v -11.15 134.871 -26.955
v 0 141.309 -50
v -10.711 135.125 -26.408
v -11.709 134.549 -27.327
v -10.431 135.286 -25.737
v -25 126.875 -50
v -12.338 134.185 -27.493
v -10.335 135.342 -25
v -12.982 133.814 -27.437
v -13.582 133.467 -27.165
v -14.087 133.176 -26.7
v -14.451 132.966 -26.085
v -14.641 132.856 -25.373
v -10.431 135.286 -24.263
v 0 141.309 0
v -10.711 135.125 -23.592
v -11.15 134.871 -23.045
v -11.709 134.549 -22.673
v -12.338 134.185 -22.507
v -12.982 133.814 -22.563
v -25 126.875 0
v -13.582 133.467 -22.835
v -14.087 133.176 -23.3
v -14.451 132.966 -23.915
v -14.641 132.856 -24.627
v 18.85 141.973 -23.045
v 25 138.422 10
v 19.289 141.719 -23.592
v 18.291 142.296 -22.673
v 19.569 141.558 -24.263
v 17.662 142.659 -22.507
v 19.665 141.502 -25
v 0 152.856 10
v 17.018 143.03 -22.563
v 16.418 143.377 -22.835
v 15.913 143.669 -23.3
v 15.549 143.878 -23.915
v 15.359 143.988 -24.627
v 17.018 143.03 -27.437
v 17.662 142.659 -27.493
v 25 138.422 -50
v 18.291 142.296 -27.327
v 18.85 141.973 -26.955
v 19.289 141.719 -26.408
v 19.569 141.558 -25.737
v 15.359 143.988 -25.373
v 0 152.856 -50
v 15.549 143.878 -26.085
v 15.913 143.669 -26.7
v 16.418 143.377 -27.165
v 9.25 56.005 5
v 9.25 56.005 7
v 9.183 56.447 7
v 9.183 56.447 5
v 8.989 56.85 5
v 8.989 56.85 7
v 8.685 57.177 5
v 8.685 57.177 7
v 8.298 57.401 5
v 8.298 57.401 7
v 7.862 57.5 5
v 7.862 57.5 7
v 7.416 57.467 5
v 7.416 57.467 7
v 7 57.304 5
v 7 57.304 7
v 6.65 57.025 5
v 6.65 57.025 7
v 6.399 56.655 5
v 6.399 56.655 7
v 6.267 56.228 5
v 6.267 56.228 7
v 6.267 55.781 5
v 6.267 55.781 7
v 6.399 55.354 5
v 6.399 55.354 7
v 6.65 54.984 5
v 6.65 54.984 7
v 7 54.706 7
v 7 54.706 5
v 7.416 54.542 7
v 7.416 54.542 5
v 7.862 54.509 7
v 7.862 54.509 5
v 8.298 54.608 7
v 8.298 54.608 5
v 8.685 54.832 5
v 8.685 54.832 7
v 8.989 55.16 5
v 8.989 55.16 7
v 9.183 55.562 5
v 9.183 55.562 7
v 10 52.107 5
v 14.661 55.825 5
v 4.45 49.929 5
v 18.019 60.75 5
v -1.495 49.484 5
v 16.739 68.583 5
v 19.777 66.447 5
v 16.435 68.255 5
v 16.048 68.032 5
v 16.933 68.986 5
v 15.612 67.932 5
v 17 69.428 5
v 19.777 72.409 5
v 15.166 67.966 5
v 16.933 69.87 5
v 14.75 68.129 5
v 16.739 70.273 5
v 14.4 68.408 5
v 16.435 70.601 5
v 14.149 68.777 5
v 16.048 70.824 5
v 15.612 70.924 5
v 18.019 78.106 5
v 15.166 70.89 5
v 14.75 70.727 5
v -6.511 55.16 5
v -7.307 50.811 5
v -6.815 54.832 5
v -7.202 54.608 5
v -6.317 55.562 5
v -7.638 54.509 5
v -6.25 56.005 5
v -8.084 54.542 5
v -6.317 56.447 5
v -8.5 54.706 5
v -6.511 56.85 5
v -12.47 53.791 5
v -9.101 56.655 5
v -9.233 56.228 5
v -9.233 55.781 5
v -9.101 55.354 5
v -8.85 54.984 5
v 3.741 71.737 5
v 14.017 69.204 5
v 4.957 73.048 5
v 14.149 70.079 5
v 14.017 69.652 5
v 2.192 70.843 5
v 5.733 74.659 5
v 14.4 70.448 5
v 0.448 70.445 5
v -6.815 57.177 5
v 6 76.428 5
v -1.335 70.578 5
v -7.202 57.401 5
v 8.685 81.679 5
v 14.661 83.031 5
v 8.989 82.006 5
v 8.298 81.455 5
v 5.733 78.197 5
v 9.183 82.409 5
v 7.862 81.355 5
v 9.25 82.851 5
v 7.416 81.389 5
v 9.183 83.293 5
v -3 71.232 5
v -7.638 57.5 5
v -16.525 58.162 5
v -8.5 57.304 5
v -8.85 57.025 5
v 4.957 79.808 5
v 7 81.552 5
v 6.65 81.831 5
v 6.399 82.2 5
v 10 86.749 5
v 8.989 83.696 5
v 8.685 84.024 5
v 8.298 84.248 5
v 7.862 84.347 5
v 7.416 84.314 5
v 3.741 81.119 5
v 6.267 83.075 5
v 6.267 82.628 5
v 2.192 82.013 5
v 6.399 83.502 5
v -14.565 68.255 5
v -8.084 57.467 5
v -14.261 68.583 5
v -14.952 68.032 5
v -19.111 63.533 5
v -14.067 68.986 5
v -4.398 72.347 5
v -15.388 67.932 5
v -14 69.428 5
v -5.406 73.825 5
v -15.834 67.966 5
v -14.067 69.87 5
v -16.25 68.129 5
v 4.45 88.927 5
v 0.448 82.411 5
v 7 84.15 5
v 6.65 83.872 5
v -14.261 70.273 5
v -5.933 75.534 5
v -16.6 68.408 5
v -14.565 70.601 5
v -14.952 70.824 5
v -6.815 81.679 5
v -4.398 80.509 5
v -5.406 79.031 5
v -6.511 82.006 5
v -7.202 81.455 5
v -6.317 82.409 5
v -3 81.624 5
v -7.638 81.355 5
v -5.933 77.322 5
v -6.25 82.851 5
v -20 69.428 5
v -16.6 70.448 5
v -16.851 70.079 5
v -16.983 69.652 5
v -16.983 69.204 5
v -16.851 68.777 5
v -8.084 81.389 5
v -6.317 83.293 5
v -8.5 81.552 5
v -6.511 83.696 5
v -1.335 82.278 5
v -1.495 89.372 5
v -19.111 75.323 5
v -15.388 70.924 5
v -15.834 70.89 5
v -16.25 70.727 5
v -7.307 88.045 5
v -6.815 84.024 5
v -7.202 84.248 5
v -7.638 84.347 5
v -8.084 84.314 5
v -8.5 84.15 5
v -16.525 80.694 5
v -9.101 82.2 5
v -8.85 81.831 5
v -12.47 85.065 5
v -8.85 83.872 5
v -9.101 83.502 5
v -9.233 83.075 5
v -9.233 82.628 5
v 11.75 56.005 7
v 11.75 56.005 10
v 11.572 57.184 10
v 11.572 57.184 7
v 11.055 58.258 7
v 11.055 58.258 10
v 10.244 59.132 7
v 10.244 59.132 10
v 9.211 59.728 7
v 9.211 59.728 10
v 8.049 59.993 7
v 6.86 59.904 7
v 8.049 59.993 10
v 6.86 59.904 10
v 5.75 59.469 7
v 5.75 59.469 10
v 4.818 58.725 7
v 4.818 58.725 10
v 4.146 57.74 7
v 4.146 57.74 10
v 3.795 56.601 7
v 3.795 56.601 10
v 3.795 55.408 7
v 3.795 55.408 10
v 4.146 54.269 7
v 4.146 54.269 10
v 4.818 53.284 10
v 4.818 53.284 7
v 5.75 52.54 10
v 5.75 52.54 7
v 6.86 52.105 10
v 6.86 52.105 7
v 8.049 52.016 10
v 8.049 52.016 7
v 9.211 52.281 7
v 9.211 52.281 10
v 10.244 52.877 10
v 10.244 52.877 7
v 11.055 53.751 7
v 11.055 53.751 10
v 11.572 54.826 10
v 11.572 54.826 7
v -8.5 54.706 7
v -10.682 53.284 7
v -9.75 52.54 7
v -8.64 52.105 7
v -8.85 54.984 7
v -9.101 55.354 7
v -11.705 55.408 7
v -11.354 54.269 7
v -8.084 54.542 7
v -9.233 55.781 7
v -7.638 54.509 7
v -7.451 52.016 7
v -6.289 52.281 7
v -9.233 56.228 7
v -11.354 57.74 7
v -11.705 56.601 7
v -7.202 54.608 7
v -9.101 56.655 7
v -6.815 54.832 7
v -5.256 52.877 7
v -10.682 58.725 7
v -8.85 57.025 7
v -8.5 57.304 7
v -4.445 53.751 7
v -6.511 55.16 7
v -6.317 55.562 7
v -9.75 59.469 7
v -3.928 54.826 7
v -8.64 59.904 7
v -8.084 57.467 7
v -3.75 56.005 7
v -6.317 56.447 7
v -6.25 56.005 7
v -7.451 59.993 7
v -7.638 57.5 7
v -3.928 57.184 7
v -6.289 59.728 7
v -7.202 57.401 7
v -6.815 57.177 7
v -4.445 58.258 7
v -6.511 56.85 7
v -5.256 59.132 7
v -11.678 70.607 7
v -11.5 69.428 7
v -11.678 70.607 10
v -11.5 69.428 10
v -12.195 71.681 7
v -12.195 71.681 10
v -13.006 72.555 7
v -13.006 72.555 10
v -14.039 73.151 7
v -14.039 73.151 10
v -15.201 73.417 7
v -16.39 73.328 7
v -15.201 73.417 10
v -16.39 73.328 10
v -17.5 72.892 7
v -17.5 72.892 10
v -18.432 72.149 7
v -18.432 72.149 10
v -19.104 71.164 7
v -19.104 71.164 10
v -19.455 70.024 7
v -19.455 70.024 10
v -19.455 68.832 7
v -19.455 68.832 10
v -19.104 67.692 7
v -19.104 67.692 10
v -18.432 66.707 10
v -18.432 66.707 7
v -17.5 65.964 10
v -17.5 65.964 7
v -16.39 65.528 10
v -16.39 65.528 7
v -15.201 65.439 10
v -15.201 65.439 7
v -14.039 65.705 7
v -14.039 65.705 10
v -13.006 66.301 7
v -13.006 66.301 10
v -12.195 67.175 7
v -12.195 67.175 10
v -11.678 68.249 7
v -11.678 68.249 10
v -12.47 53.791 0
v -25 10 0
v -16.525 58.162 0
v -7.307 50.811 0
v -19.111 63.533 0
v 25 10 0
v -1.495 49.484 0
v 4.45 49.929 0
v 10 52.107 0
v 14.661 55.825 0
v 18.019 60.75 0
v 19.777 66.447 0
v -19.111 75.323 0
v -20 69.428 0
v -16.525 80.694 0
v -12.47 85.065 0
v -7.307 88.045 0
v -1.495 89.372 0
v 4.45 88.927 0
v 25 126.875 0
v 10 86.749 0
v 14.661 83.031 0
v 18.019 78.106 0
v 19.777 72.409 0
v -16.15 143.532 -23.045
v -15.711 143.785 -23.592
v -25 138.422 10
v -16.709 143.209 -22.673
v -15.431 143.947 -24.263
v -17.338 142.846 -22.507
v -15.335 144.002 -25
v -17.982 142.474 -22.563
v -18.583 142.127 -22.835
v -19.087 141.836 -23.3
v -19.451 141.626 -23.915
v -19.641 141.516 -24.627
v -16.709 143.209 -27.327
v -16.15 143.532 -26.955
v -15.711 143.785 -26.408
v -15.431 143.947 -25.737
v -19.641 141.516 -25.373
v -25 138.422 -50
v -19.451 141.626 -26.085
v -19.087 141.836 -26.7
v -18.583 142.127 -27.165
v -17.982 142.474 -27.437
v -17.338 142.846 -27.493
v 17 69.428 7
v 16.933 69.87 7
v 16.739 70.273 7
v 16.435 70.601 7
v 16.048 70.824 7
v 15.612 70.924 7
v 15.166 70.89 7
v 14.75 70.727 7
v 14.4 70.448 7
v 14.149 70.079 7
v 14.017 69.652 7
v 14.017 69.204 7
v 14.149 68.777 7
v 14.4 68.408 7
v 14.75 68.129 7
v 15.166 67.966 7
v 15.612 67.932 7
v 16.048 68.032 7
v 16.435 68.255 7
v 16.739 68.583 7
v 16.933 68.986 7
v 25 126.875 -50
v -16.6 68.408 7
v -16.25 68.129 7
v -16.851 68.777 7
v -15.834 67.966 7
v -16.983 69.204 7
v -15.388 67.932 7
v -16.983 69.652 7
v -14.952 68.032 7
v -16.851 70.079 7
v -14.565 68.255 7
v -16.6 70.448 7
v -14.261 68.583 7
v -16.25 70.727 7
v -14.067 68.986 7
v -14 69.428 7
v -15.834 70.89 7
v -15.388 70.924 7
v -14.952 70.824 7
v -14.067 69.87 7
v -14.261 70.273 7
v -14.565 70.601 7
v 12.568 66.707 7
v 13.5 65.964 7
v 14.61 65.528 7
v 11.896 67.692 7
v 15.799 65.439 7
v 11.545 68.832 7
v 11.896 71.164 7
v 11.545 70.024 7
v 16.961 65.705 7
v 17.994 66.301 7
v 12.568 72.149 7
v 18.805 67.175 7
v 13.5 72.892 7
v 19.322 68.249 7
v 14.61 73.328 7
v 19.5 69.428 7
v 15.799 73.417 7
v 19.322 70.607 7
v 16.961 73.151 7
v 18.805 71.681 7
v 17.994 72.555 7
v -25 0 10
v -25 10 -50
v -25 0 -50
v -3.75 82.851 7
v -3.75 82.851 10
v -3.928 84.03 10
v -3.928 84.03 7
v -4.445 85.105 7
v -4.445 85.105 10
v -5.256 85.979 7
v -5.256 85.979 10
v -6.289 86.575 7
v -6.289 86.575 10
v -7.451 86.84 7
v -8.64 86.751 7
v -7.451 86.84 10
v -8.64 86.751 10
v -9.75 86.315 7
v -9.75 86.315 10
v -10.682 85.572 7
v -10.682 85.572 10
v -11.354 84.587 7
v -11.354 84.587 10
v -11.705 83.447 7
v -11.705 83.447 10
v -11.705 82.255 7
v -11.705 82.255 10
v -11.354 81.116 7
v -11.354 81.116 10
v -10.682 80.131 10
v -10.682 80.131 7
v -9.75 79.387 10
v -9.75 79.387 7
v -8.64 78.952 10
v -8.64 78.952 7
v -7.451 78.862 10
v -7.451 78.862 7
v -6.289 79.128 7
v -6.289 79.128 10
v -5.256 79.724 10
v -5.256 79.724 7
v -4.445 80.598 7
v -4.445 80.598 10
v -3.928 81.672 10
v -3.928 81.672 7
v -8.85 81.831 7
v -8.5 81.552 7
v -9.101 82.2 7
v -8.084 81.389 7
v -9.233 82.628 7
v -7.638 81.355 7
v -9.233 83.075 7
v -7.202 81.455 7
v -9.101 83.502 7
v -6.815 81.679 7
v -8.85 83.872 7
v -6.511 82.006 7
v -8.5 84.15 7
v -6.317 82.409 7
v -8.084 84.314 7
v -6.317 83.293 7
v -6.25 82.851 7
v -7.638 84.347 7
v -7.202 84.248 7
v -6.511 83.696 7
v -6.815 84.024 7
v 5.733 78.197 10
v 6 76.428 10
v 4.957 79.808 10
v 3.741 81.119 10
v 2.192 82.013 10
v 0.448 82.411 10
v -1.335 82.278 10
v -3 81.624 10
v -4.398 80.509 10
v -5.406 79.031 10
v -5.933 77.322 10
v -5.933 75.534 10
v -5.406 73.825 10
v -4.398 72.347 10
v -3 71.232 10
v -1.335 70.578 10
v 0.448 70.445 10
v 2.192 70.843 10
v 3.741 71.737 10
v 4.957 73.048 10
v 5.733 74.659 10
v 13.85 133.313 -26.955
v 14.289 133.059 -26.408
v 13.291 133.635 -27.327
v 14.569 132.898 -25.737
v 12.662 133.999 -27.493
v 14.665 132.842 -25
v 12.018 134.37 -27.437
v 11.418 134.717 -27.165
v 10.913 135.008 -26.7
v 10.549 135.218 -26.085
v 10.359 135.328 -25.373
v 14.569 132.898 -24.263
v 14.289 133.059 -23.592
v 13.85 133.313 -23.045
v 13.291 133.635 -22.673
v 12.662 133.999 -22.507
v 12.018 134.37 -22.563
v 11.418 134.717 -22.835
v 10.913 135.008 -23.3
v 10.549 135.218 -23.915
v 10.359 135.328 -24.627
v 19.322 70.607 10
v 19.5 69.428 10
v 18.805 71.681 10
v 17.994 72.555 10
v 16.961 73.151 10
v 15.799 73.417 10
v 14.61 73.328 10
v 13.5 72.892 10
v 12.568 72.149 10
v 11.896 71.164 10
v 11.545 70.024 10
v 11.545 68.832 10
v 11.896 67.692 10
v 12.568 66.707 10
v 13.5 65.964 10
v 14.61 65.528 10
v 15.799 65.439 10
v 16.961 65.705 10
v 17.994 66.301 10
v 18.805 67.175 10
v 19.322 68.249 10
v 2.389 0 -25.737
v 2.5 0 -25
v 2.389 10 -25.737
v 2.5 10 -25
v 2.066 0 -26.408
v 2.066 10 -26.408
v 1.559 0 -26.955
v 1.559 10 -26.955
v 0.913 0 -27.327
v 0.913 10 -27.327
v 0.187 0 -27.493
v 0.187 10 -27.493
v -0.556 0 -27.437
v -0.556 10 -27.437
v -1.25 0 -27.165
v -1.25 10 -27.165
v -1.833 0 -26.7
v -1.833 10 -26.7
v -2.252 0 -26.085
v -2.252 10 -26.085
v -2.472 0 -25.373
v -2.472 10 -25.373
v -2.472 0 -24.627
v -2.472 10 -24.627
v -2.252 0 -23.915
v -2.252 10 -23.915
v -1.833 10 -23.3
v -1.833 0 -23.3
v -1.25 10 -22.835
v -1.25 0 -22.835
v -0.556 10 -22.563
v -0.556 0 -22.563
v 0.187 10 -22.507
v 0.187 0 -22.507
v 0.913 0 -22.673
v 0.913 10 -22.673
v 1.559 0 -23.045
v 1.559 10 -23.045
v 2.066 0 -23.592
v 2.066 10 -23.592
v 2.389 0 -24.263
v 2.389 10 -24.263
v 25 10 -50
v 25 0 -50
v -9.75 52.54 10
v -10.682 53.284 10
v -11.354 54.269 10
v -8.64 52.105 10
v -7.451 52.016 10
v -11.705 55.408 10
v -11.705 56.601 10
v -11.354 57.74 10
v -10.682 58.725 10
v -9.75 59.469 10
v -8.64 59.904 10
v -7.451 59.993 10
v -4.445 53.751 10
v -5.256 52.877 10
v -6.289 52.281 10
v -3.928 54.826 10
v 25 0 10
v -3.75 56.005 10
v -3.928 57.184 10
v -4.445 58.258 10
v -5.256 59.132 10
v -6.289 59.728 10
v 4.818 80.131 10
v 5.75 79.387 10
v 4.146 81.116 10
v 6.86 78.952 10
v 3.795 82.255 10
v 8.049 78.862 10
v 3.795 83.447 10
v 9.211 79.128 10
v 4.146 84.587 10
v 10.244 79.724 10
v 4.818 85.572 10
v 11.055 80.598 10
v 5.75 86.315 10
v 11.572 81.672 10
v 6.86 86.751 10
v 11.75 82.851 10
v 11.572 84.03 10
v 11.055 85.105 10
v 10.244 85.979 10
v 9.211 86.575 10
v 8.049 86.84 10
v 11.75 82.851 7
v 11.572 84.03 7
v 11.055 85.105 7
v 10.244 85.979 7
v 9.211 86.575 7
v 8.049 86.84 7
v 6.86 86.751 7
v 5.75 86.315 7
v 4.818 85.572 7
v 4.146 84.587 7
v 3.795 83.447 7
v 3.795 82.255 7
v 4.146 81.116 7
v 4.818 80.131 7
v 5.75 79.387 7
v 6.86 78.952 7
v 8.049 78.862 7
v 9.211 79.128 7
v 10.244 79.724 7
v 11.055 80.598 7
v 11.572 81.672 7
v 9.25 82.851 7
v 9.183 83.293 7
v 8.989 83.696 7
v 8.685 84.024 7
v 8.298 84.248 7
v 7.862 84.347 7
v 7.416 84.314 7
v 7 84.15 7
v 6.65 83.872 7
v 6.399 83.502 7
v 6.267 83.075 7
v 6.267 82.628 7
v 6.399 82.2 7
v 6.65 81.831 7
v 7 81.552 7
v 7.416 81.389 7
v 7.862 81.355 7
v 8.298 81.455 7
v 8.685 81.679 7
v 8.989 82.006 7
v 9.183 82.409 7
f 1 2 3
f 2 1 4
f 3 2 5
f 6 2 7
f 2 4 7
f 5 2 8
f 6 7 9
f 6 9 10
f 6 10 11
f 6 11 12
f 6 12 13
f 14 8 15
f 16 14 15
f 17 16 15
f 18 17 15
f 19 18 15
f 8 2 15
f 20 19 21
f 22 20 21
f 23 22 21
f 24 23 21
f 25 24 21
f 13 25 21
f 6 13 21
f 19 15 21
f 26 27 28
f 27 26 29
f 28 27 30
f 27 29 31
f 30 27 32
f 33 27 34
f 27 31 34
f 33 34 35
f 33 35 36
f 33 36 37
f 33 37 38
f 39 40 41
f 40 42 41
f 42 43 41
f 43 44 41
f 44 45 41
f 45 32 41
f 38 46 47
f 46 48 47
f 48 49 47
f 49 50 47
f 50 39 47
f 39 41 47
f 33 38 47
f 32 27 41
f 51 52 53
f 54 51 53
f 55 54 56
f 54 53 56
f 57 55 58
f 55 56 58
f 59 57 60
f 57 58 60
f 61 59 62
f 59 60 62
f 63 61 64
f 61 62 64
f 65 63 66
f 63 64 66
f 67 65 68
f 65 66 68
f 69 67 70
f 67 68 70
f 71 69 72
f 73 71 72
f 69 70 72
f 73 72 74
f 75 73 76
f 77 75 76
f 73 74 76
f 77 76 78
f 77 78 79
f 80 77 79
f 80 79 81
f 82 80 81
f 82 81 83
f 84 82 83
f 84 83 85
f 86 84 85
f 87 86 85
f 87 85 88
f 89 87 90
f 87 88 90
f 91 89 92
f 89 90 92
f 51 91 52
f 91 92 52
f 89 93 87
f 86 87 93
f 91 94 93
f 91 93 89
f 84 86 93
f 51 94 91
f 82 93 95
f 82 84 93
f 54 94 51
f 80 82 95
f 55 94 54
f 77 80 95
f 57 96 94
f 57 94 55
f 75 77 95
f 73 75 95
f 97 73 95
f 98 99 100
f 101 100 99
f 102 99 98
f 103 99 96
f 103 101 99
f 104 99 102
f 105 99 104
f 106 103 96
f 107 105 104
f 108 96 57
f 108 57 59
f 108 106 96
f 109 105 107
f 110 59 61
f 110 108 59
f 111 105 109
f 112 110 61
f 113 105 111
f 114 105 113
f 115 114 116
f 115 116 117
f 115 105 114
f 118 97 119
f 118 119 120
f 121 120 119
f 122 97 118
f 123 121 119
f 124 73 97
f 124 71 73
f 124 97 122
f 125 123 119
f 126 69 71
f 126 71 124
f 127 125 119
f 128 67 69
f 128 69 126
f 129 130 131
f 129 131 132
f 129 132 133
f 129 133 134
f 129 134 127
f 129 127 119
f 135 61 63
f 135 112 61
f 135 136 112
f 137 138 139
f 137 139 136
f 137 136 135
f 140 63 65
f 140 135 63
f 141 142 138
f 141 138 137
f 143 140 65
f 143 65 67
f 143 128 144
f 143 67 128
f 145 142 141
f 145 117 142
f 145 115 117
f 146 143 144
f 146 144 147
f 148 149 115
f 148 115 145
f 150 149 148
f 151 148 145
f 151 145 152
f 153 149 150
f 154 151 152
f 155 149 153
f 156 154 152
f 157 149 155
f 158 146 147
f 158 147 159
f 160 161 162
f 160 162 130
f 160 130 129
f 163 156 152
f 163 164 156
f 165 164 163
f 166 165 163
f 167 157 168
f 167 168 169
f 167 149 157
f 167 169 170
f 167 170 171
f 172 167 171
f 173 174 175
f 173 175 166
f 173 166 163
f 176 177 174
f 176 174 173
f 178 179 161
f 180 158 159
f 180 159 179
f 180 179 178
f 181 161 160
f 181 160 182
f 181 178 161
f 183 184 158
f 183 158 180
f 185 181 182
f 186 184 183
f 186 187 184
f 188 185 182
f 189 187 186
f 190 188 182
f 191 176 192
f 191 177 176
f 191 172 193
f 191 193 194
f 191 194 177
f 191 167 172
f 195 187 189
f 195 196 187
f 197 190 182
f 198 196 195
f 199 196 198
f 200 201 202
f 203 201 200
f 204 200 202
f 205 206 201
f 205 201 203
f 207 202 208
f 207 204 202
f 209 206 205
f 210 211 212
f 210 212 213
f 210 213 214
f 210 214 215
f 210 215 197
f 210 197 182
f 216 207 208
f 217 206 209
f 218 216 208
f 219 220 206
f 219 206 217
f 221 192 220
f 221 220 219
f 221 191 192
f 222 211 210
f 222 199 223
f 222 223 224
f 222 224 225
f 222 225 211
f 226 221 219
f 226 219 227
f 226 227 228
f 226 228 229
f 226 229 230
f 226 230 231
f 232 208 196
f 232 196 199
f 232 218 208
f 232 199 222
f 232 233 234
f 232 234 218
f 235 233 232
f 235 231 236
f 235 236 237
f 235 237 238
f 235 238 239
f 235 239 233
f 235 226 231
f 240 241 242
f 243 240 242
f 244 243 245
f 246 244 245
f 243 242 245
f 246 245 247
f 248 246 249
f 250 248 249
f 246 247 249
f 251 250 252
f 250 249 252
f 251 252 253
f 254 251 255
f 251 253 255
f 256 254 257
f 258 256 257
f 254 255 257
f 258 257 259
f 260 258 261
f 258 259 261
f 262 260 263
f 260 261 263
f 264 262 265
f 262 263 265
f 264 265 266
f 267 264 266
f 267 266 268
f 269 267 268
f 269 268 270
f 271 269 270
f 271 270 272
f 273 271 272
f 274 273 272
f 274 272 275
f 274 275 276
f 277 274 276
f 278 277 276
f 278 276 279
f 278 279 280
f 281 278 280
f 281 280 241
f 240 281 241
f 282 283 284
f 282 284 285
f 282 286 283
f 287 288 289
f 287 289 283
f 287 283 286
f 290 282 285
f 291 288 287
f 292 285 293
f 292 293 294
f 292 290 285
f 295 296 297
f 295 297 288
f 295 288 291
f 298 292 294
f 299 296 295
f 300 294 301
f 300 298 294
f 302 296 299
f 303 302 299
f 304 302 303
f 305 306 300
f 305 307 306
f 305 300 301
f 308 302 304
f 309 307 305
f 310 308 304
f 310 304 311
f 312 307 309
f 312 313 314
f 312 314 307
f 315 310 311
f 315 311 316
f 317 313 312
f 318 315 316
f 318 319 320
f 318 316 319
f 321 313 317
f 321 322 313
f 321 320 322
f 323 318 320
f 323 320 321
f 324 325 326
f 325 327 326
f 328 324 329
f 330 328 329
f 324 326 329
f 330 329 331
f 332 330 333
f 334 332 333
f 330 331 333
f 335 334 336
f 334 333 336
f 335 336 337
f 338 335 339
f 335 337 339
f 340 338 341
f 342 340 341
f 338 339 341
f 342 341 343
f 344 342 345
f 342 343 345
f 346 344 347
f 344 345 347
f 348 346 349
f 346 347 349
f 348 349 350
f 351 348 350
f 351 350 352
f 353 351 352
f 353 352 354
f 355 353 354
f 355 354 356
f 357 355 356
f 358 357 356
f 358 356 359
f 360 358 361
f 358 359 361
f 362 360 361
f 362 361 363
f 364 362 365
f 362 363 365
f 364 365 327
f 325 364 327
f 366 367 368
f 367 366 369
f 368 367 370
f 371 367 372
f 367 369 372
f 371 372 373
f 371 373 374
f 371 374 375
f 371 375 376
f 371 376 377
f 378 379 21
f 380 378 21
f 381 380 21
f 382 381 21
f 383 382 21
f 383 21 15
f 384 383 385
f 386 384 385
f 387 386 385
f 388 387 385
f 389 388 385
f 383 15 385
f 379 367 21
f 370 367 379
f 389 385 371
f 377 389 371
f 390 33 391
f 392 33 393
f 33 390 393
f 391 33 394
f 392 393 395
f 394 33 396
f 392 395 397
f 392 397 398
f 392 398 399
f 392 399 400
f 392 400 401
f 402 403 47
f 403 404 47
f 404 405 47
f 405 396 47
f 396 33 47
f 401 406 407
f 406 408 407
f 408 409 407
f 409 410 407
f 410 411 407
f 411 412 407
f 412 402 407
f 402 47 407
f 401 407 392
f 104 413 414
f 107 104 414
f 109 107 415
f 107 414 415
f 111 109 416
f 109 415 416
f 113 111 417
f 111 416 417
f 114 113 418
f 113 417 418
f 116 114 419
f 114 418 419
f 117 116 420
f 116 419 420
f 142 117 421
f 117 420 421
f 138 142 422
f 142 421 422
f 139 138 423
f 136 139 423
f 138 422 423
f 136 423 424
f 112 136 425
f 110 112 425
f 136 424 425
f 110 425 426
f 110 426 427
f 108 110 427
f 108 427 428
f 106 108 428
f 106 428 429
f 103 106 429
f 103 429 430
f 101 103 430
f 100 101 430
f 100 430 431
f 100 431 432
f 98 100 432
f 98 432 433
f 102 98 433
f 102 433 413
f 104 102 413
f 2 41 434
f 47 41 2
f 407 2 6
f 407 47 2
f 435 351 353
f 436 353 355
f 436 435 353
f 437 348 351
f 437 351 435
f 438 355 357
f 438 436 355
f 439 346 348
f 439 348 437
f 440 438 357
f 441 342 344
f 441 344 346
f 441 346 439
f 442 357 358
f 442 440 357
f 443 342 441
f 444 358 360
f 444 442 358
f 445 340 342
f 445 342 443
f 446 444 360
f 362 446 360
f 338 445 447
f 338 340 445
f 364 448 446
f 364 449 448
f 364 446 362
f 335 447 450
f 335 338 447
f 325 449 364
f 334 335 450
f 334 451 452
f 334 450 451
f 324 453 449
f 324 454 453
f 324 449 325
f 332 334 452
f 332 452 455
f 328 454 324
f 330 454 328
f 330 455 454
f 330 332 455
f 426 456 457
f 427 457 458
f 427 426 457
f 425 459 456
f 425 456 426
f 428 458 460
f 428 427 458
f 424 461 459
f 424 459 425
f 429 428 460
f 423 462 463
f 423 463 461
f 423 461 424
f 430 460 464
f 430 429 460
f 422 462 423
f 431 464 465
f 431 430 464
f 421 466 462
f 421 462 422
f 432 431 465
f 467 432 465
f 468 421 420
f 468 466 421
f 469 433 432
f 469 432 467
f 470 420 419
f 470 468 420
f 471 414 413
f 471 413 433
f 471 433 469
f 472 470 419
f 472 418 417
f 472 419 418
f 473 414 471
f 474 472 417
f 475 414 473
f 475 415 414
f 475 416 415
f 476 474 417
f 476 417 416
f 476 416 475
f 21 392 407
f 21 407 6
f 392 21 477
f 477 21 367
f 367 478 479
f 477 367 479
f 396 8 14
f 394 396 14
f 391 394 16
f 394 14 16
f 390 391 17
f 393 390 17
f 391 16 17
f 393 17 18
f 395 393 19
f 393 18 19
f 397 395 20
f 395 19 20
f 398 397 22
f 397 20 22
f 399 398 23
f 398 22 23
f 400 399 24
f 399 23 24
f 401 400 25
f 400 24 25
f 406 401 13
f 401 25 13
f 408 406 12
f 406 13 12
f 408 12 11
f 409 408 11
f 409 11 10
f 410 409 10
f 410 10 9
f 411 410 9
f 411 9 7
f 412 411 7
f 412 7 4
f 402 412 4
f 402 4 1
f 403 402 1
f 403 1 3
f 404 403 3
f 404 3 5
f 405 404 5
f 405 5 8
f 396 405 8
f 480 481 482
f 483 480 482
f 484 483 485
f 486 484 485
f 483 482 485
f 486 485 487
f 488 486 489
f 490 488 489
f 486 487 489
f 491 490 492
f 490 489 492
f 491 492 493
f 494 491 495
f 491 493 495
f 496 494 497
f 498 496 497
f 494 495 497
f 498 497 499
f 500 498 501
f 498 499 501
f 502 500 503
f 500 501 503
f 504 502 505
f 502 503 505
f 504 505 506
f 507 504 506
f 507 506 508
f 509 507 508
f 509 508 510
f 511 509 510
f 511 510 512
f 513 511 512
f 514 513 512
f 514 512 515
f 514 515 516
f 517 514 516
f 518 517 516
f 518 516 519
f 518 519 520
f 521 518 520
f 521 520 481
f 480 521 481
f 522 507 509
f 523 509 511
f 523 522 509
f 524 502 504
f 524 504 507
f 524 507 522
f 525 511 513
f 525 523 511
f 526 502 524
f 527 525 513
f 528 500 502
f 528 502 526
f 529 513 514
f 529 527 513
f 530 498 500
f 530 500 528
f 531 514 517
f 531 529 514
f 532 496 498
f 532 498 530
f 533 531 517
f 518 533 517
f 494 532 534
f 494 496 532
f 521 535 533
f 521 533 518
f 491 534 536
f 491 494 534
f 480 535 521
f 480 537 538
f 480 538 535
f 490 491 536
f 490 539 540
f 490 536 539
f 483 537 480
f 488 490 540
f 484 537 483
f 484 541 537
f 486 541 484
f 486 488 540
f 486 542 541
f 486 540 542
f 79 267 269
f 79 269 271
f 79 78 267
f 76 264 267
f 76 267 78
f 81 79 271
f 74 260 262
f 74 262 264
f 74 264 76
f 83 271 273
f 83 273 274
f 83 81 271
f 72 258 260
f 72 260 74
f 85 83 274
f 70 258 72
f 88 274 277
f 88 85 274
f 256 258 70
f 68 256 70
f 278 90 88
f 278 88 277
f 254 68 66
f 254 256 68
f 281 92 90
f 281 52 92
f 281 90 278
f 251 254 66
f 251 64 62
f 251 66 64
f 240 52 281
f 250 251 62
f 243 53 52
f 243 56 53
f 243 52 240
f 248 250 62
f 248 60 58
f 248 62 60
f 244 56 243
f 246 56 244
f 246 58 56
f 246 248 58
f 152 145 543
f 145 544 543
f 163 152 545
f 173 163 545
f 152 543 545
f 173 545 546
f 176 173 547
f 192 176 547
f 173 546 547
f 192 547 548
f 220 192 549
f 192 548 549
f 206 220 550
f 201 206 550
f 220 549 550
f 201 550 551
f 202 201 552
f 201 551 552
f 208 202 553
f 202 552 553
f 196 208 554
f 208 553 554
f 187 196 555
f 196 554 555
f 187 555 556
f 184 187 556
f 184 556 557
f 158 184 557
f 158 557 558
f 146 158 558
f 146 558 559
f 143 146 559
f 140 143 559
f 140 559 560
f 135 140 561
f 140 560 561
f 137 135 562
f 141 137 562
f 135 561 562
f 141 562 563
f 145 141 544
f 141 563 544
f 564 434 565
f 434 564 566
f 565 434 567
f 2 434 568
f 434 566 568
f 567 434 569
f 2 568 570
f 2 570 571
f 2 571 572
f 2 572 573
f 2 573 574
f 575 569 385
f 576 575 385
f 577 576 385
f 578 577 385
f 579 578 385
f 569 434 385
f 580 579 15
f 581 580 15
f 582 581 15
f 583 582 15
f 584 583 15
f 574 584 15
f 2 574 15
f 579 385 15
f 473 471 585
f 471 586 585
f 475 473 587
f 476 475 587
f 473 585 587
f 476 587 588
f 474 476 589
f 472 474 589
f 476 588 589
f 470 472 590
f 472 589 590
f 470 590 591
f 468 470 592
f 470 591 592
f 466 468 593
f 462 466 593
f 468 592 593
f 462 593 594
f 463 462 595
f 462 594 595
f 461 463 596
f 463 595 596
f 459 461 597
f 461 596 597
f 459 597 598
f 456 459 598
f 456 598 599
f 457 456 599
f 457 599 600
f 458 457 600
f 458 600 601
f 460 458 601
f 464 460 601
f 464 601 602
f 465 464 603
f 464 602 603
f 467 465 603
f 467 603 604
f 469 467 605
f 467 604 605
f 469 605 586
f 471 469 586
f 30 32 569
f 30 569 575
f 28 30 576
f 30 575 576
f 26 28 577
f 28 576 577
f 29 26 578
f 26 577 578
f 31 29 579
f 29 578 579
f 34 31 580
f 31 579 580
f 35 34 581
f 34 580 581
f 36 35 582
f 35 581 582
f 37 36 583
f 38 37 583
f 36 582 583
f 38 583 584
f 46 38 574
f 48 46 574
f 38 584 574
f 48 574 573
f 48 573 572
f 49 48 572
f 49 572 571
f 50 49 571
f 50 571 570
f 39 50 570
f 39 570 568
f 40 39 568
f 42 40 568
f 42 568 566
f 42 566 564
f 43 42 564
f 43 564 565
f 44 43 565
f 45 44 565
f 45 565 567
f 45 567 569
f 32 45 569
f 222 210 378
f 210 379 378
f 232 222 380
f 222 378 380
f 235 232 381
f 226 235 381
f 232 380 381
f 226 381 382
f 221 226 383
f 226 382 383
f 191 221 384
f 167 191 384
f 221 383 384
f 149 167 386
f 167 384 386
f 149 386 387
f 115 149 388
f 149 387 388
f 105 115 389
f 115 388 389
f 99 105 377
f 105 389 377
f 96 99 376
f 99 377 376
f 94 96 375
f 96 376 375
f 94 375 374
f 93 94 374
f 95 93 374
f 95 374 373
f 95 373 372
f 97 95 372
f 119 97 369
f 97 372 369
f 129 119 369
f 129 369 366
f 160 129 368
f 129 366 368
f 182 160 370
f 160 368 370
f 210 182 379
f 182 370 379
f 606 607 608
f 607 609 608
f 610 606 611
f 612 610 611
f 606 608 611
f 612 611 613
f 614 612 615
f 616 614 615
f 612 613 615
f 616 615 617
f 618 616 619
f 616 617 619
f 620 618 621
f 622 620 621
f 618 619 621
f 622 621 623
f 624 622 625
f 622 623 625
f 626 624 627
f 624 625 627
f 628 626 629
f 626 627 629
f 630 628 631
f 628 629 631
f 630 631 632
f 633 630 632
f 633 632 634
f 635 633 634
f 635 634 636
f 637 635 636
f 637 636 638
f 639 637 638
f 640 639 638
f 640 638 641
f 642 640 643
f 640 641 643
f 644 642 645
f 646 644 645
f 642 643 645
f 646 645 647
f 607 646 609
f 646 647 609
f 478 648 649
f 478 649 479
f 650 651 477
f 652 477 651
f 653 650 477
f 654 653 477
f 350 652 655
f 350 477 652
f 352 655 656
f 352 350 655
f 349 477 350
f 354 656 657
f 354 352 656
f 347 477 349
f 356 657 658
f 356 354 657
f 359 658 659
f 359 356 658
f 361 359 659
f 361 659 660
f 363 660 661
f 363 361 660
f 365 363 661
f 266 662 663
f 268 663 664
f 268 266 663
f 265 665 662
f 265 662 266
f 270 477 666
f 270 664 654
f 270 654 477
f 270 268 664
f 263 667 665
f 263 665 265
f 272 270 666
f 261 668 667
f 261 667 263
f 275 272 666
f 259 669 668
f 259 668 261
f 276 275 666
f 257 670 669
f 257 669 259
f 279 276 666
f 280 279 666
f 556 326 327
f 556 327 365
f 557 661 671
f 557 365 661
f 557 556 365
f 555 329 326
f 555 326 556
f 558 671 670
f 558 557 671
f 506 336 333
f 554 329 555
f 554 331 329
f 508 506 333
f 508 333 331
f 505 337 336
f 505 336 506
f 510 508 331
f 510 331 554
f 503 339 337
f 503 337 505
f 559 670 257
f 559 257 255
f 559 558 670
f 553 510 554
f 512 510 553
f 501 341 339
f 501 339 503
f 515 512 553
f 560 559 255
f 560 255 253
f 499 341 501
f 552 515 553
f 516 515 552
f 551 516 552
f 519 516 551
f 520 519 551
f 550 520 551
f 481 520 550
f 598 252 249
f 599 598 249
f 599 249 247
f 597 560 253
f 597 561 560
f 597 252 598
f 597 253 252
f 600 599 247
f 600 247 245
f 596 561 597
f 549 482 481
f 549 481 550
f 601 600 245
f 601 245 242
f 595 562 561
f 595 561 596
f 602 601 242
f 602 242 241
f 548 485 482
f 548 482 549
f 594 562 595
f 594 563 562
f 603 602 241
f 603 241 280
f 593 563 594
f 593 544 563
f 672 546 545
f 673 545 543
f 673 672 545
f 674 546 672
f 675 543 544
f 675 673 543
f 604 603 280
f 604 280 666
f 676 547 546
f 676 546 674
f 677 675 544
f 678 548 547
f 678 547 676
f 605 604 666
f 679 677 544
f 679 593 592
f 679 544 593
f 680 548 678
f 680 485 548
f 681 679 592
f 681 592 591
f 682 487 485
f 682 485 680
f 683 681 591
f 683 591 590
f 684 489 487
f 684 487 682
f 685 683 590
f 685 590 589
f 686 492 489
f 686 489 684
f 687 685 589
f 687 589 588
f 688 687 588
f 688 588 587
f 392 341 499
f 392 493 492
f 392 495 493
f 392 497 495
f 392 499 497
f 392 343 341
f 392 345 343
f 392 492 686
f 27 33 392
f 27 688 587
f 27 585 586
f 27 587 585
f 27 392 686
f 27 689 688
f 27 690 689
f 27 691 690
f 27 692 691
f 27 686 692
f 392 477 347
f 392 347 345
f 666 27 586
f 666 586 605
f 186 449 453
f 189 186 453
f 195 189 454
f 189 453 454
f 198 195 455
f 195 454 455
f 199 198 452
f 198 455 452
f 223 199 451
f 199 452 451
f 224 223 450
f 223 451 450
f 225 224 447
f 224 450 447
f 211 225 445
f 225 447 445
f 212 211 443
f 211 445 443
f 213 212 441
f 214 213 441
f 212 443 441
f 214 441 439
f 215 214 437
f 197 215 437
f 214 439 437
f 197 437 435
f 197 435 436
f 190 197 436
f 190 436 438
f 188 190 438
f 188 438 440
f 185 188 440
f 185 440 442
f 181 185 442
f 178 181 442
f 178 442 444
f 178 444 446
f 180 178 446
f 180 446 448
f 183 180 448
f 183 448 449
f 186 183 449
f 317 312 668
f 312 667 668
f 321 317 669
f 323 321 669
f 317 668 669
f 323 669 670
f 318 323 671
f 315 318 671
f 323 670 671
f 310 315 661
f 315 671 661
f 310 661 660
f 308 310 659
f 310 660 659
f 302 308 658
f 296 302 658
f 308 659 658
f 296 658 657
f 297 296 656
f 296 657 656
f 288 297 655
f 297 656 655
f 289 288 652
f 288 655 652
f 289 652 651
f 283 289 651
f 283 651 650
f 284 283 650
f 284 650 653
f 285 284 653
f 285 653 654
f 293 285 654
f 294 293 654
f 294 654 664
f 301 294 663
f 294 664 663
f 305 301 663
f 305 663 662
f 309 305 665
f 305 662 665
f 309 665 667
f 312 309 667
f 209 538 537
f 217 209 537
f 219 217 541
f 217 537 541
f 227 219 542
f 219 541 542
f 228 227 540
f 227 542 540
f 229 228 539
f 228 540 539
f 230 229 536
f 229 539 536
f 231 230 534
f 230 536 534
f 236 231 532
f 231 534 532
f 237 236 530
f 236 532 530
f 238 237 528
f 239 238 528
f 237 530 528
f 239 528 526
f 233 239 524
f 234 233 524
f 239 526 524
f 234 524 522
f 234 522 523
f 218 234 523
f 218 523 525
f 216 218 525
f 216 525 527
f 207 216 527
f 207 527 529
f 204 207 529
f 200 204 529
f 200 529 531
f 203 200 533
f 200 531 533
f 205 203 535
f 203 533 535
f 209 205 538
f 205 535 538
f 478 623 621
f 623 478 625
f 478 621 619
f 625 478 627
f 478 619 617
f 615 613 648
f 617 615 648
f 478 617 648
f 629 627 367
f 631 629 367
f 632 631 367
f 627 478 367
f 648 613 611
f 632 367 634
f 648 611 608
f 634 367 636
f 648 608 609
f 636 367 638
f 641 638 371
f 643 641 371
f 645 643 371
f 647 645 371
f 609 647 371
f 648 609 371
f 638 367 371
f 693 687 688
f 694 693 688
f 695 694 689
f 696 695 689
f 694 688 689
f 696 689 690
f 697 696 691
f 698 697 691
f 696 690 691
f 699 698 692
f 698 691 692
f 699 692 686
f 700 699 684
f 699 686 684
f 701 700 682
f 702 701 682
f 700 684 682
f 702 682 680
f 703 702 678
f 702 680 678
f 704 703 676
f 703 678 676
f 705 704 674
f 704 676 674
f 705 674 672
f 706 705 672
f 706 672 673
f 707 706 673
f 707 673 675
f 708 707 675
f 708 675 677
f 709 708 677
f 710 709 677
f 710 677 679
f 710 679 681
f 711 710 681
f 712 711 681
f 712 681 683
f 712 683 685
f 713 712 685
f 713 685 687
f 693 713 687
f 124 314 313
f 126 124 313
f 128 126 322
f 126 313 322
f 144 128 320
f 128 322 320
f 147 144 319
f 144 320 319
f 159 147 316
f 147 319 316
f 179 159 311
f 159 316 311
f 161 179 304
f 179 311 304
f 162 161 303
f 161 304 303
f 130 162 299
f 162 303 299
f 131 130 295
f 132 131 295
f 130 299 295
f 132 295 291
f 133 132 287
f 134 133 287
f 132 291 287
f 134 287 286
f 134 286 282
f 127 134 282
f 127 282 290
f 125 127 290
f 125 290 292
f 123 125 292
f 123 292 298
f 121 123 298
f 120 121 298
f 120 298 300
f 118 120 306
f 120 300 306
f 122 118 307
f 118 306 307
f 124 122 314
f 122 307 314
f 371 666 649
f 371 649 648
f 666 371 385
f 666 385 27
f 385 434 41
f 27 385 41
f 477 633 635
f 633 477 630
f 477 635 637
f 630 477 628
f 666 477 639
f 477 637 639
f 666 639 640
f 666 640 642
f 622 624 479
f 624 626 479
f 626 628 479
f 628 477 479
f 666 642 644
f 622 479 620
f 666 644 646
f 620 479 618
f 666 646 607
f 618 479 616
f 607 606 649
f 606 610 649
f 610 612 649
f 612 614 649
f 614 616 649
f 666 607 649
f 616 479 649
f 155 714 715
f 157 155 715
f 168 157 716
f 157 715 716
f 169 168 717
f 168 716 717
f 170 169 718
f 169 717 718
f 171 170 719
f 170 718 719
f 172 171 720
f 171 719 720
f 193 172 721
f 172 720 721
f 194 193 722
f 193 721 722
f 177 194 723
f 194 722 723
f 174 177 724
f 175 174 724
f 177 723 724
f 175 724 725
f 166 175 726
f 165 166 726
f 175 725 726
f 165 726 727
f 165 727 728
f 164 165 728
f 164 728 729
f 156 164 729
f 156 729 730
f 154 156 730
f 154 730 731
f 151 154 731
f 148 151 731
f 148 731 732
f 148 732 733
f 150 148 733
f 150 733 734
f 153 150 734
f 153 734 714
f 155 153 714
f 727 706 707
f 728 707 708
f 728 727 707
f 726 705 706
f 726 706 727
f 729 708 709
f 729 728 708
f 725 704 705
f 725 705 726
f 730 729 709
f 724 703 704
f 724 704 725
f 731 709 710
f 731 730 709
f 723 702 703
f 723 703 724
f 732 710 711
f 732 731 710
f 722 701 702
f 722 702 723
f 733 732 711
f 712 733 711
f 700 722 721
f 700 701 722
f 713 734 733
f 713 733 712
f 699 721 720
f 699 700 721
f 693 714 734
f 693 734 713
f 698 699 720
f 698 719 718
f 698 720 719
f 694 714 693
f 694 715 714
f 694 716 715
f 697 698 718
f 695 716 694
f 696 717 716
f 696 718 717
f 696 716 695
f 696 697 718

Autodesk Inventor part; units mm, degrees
ref_plane "YZ Plane" through (0, 0, 0) normal (1, 0, 0) x (0, 1, 0)
ref_plane "XZ Plane" through (0, 0, 0) normal (0, 1, 0) x (-1, 0, 0)
ref_plane "XY Plane" through (0, 0, 0) normal (0, 0, 1) x (1, 0, 0)
sketch "Sketch1" plane through (0, 0, 0) normal (0, 0, 1) x (1, 0, 0)
  line L0 (0, 0) -> (0, 152.8559)
  line L1 (0, 152.8559) -> (-25, 138.4222)
  line L2 (-25, 138.4222) -> (-25, 0)
  line L3 (-25, 0) -> (25, 0)
  line L4 (25, 0) -> (25, 138.4222)
  line L5 (25, 138.4222) -> (0, 152.8559)
  dimension "d0" = 152.8559
  dimension "d1" = 60
  dimension "d2" = 60
  dimension "d3" = 50
extrude "Extrusion1" add sketch "Sketch1" along normal blind 10
sketch "Sketch2" plane through (0, 0, 0) normal (0, 0, -1) x (-1, 0, 0)
  line L0 (0, 152.8559) -> (25, 138.4222) projected
  line L1 (-25, 138.4222) -> (0, 152.8559) projected
  line L2 (25, 0) -> (-25, 0) projected
  line L3 (-25, 0) -> (25, 0)
  line L4 (25, 0) -> (25, 10)
  line L5 (25, 10) -> (-25, 10)
  line L6 (-25, 10) -> (-25, 0)
  line L7 (25, 138.4222) -> (25, 0) construction
  line L8 (-25, 0) -> (-25, 138.4222) construction
  line L9 (-25, 126.8751) -> (0, 141.3089)
  line L10 (0, 141.3089) -> (25, 126.8751)
  line L11 (25, 138.4222) -> (25, 0) projected
  line L12 (-25, 126.8751) -> (-25, 138.4222)
  line L13 (0, 152.8559) -> (25, 138.4222) projected
  line L14 (25, 126.8751) -> (25, 138.4222)
  point P0 (0, 0)
  dimension "d6" = 10
  dimension "d7" = 10
extrude "Extrusion2" add sketch "Sketch2" along normal blind 50
sketch "Sketch3" plane through (0, 141.3089, -50) normal (-0.5, -0.8660254, 0) x (0.8660254, -0.5, 0)
  circle A0 centre (14.4338, 25) radius 2.5
  line L0 (28.8675, 50) -> (28.8675, 0) projected
  line L1 (28.8675, 0) -> (0, 0) projected
  point P0 (70.6545, 50)
  point P1 (14.4338, 0)
  point P2 (28.8675, 25)
  dimension "d10" = 5
extrude "Extrusion3" cut sketch "Sketch3" against normal through all
sketch "Sketch4" plane through (-25, 126.8751, -50) normal (0.5, -0.8660254, 0) x (0.8660254, 0.5, 0)
  line L0 (0, 50) -> (0, 0) projected
  line L1 (28.8675, 0) -> (0, 0) projected
  circle A0 centre (14.4338, 25) radius 2.5
  point P0 (-41.7869, 50)
  point P1 (14.4338, 0)
  point P2 (0, 25)
  dimension "d13" = 5
extrude "Extrusion4" cut sketch "Sketch4" against normal through all
sketch "Sketch5" plane through (-25, 10, 0) normal (0, 1, 0) x (1, 0, 0)
  line L0 (0, 0) -> (0, 50) projected
  line L1 (0, 50) -> (50, 50) projected
  circle A0 centre (25, 25) radius 2.5
  point P0 (25, 0)
  point P1 (25, 50)
  point P2 (0, 25)
  dimension "d16" = 5
extrude "Extrusion5" cut sketch "Sketch5" against normal through all
sketch "Sketch6" plane through (0, 0, 10) normal (0, 0, 1) x (1, 0, 0)
  circle A0 centre (0, 76.428) radius 6
  line L0 (-25, 138.4222) -> (0, 152.8559) construction
  line L1 (0, 152.8559) -> (0, 0) construction
  circle A1 centre (0, 69.428) radius 1.5 construction
  circle A2 centre (15.5, 69.428) radius 1.5
  circle A3 centre (7.75, 82.8513) radius 1.5
  circle A4 centre (-7.75, 82.8513) radius 1.5
  circle A5 centre (-15.5, 69.428) radius 1.5
  circle A6 centre (-7.75, 56.0046) radius 1.5
  circle A7 centre (7.75, 56.0046) radius 1.5
  point P0 (0, 76.428)
  dimension "d19" = 12
  dimension "d22" = 3
  dimension "d23" = 7
  dimension "d24" = 3
  dimension "d25" = 15.5
  dimension "d28" = 360
extrude "Extrusion6" cut sketch "Sketch6" against normal through all
sketch "Sketch7" plane through (0, 0, 0) normal (0, 0, -1) x (-1, 0, 0)
  circle A0 centre (-7.75, 56.0046) radius 1.5 projected
  circle A1 centre (15.5, 69.428) radius 1.5 projected
  circle A2 centre (-7.75, 82.8513) radius 1.5 projected
  circle A3 centre (-15.5, 69.428) radius 1.5 projected
  circle A4 centre (7.75, 82.8513) radius 1.5 projected
  circle A5 centre (7.75, 56.0046) radius 1.5 projected
  circle A6 centre (0, 76.428) radius 6 projected
  line L0 (-25, 10) -> (25, 10) projected
  line L1 (25, 126.8751) -> (25, 10) projected
  line L2 (25, 126.8751) -> (0, 141.3089) projected
  line L3 (0, 141.3089) -> (-25, 126.8751) projected
  line L4 (-25, 10) -> (-25, 126.8751) projected
  circle A7 centre (0, 69.428) radius 20
  point P0 (0, 0)
  dimension "d32" = 40
extrude "Extrusion7" cut sketch "Sketch7" against normal blind 5 contours A0 | A1 | A2 | A3 | A4 | A5 | A6 | A7
sketch "Sketch8" plane through (0, 0, 10) normal (0, 0, 1) x (1, 0, 0)
  circle A0 centre (15.5, 69.428) radius 1.5 projected
  circle A1 centre (0, 69.428) radius 1.5
  line L0 (-25, 0) -> (25, 0) projected
  circle A2 centre (15.5, 69.428) radius 4
  circle A3 centre (7.75, 82.8513) radius 4
  circle A4 centre (-7.75, 82.8513) radius 4
  circle A5 centre (-15.5, 69.428) radius 4
  circle A6 centre (-7.75, 56.0046) radius 4
  circle A7 centre (7.75, 56.0046) radius 4
  point P0 (0, 0)
  point P1 (0, 0)
  dimension "d35" = 3
  dimension "d36" = 8
  dimension "d39" = 360
extrude "Extrusion8" cut sketch "Sketch8" against normal blind 3 contours A0 | A2 | A3 | A4 | A5 | A6 | A7
properties part number "BO12" material "ABS Plastic"
